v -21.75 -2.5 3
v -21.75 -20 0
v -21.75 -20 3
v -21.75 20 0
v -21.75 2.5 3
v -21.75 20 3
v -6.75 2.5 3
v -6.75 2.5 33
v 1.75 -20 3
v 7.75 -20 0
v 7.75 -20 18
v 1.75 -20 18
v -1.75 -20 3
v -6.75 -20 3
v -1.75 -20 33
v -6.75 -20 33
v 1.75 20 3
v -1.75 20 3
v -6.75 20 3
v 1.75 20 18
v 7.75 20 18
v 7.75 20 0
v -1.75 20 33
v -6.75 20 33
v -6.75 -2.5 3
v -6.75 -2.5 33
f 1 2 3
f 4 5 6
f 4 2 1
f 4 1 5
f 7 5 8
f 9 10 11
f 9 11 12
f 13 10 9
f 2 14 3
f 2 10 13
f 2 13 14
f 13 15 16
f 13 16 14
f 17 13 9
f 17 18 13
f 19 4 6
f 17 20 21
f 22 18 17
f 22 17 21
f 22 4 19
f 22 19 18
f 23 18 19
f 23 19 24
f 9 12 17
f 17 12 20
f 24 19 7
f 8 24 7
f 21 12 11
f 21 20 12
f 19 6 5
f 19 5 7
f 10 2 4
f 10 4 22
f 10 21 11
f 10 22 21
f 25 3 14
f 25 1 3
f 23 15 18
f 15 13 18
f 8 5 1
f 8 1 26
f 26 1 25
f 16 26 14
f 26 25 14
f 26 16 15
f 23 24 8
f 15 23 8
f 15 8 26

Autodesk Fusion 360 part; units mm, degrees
sketch "Sketch1" plane through (0, 0, 0) normal (0, 0, 1) x (1, 0, 0)
  line L0 (6.75, 20) -> (-6.75, 20)
  line L1 (-6.75, 20) -> (-6.75, -20)
  line L2 (-6.75, -20) -> (6.75, -20)
  line L3 (6.75, -20) -> (6.75, 20)
  line L4 (6.75, 20) -> (-6.75, -20) construction
  line L5 (-6.75, 20) -> (6.75, -20) construction
  line L6 (1.5, -20) -> (-1.5, -20)
  line L7 (-1.5, -20) -> (-1.5, 20)
  line L8 (-1.5, 20) -> (1.5, 20)
  line L9 (1.5, 20) -> (1.5, -20)
  line L10 (1.5, -20) -> (-1.5, 20) construction
  line L11 (-1.5, -20) -> (1.5, 20) construction
  line L12 (1.75, -20) -> (-1.75, -20)
  line L13 (-1.75, -20) -> (-1.75, 20)
  line L14 (-1.75, 20) -> (1.75, 20)
  line L15 (1.75, 20) -> (1.75, -20)
  line L16 (1.75, -20) -> (-1.75, 20) construction
  line L17 (-1.75, -20) -> (1.75, 20) construction
  line L18 (5, -5) -> (-5, -5)
  line L19 (-5, -5) -> (-5, 5)
  line L20 (-5, 5) -> (5, 5)
  line L21 (5, 5) -> (5, -5)
  line L22 (5, -5) -> (-5, 5) construction
  line L23 (-5, -5) -> (5, 5) construction
  line L24 (1.75, -20) -> (6.75, -20)
  line L25 (6.75, -20) -> (6.75, 20)
  line L26 (6.75, 20) -> (1.75, 20)
  line L27 (1.75, 20) -> (1.75, -20)
  line L28 (-6.75, -20) -> (-21.75, -20)
  line L29 (-21.75, -20) -> (-21.75, 20)
  line L30 (-21.75, 20) -> (-6.75, 20)
  line L31 (-6.75, 20) -> (-6.75, -20)
  line L32 (6.75, 20) -> (7.75, 20)
  line L33 (7.75, 20) -> (7.75, -20)
  line L34 (7.75, -20) -> (6.75, -20)
  line L35 (6.75, -20) -> (6.75, 20)
  dimension "d1" = 13.5
  dimension "d2" = 40
  dimension "d3" = 3
  dimension "d4" = 3.5
  dimension "d5" = 40
  dimension "d6" = 10
  dimension "d7" = 10
  dimension "d18" = 5
  dimension "d19" = 15
  dimension "d20" = 40
  dimension "d29" = 1
  dimension "d30" = 40
extrude "Extrude1" add sketch "Sketch1" along normal blind 20 contours L0 L2 L3 L15 L18 L20 L21 L24 L25 L26 L27 L35 | L15 L18 L20 L21 L27 | L0 L1 L2 L13 L18 L19 L20 L31 | L13 L18 L19 L20 makes body 1 at (-1.75, -6.6667, 6.6667) makes body 2 at (6.75, -6.6667, 6.6667)
extrude "Extrude2" add 1 faces at (-3.4167, -6.6667, 20) along direction (0, 0, 1) blind 15 on bodies 1 bodies 1
extrude "Extrude3" add sketch "Sketch1" along normal blind 5 contours L0 L9 L14 L15 L20 L27 | L0 L7 L8 L9 L14 L20 | L9 L15 L18 L20 L27 | L2 L9 L12 L15 L18 L27 | L0 L7 L13 L14 L20 | L7 L9 L18 L20 | L2 L6 L7 L9 L12 L18 | L7 L13 L18 L20 | L2 L7 L12 L13 L18 bodies 1 2
extrude "Extrude4" add sketch "Sketch1" along normal blind 5 contours L0 L2 L3 L15 L18 L20 L21 L24 L25 L26 L27 L35 | L0 L9 L14 L15 L20 L27 | L0 L7 L8 L9 L14 L20 | L2 L9 L12 L15 L18 L27 | L0 L7 L13 L14 L20 | L2 L6 L7 L9 L12 L18 | L0 L1 L2 L13 L18 L19 L20 L31 | L2 L7 L12 L13 L18 bodies 1
extrude "Extrude5" add sketch "Sketch1" along normal blind 5 contours L15 L18 L20 L21 L27 bodies 1
extrude "Extrude6" add sketch "Sketch1" along normal blind 3 contours L1 L28 L29 L30 L31 bodies 1
extrude "Extrude7" cut 1 faces at (0.5833, -6.6667, 5) along direction (0, 0, -1) blind 2 on bodies 1 bodies 1
extrude "Extrude8" cut 1 faces at (5.0833, 6.6667, 20) along direction (0, 0, -1) blind 2 on bodies 1 bodies 1
extrude "Extrude9" cut 1 faces at (-3.4167, -6.6667, 35) along direction (0, 0, -1) blind 2 on bodies 1 bodies 1
extrude "Extrude10" add sketch "Sketch1" along normal blind 18 contours L3 L25 L32 L33 L34 L35 bodies 1
sketch "Sketch2" plane through (0, 0, 0) normal (0, 1, 0) x (1, 0, 0)
  line L0 (-21.75, -3) -> (-6.75, -33)
  line L1 (-6.75, -3) -> (-21.75, -3)
  line L2 (-6.75, -33) -> (-6.75, -3)
  line L3 (-21.75, -3) -> (-6.75, -3)
  point P0 (-21.75, -3)
  point P1 (-6.75, -33)
  point P2 (-6.75, -3)
  point P3 (-6.75, -3)
extrude "Extrude11" add sketch "Sketch2" along normal blind 2.5 bodies 1
extrude "Extrude12" add sketch "Sketch2" against normal blind 2.5 bodies 1
equation "d1 = 3 mm + 0.5 mm + 5 mm + 5 mm"
equation "d8 = 5 mm + 15 mm"
equation "d31 = 3 mm + 15 mm"
